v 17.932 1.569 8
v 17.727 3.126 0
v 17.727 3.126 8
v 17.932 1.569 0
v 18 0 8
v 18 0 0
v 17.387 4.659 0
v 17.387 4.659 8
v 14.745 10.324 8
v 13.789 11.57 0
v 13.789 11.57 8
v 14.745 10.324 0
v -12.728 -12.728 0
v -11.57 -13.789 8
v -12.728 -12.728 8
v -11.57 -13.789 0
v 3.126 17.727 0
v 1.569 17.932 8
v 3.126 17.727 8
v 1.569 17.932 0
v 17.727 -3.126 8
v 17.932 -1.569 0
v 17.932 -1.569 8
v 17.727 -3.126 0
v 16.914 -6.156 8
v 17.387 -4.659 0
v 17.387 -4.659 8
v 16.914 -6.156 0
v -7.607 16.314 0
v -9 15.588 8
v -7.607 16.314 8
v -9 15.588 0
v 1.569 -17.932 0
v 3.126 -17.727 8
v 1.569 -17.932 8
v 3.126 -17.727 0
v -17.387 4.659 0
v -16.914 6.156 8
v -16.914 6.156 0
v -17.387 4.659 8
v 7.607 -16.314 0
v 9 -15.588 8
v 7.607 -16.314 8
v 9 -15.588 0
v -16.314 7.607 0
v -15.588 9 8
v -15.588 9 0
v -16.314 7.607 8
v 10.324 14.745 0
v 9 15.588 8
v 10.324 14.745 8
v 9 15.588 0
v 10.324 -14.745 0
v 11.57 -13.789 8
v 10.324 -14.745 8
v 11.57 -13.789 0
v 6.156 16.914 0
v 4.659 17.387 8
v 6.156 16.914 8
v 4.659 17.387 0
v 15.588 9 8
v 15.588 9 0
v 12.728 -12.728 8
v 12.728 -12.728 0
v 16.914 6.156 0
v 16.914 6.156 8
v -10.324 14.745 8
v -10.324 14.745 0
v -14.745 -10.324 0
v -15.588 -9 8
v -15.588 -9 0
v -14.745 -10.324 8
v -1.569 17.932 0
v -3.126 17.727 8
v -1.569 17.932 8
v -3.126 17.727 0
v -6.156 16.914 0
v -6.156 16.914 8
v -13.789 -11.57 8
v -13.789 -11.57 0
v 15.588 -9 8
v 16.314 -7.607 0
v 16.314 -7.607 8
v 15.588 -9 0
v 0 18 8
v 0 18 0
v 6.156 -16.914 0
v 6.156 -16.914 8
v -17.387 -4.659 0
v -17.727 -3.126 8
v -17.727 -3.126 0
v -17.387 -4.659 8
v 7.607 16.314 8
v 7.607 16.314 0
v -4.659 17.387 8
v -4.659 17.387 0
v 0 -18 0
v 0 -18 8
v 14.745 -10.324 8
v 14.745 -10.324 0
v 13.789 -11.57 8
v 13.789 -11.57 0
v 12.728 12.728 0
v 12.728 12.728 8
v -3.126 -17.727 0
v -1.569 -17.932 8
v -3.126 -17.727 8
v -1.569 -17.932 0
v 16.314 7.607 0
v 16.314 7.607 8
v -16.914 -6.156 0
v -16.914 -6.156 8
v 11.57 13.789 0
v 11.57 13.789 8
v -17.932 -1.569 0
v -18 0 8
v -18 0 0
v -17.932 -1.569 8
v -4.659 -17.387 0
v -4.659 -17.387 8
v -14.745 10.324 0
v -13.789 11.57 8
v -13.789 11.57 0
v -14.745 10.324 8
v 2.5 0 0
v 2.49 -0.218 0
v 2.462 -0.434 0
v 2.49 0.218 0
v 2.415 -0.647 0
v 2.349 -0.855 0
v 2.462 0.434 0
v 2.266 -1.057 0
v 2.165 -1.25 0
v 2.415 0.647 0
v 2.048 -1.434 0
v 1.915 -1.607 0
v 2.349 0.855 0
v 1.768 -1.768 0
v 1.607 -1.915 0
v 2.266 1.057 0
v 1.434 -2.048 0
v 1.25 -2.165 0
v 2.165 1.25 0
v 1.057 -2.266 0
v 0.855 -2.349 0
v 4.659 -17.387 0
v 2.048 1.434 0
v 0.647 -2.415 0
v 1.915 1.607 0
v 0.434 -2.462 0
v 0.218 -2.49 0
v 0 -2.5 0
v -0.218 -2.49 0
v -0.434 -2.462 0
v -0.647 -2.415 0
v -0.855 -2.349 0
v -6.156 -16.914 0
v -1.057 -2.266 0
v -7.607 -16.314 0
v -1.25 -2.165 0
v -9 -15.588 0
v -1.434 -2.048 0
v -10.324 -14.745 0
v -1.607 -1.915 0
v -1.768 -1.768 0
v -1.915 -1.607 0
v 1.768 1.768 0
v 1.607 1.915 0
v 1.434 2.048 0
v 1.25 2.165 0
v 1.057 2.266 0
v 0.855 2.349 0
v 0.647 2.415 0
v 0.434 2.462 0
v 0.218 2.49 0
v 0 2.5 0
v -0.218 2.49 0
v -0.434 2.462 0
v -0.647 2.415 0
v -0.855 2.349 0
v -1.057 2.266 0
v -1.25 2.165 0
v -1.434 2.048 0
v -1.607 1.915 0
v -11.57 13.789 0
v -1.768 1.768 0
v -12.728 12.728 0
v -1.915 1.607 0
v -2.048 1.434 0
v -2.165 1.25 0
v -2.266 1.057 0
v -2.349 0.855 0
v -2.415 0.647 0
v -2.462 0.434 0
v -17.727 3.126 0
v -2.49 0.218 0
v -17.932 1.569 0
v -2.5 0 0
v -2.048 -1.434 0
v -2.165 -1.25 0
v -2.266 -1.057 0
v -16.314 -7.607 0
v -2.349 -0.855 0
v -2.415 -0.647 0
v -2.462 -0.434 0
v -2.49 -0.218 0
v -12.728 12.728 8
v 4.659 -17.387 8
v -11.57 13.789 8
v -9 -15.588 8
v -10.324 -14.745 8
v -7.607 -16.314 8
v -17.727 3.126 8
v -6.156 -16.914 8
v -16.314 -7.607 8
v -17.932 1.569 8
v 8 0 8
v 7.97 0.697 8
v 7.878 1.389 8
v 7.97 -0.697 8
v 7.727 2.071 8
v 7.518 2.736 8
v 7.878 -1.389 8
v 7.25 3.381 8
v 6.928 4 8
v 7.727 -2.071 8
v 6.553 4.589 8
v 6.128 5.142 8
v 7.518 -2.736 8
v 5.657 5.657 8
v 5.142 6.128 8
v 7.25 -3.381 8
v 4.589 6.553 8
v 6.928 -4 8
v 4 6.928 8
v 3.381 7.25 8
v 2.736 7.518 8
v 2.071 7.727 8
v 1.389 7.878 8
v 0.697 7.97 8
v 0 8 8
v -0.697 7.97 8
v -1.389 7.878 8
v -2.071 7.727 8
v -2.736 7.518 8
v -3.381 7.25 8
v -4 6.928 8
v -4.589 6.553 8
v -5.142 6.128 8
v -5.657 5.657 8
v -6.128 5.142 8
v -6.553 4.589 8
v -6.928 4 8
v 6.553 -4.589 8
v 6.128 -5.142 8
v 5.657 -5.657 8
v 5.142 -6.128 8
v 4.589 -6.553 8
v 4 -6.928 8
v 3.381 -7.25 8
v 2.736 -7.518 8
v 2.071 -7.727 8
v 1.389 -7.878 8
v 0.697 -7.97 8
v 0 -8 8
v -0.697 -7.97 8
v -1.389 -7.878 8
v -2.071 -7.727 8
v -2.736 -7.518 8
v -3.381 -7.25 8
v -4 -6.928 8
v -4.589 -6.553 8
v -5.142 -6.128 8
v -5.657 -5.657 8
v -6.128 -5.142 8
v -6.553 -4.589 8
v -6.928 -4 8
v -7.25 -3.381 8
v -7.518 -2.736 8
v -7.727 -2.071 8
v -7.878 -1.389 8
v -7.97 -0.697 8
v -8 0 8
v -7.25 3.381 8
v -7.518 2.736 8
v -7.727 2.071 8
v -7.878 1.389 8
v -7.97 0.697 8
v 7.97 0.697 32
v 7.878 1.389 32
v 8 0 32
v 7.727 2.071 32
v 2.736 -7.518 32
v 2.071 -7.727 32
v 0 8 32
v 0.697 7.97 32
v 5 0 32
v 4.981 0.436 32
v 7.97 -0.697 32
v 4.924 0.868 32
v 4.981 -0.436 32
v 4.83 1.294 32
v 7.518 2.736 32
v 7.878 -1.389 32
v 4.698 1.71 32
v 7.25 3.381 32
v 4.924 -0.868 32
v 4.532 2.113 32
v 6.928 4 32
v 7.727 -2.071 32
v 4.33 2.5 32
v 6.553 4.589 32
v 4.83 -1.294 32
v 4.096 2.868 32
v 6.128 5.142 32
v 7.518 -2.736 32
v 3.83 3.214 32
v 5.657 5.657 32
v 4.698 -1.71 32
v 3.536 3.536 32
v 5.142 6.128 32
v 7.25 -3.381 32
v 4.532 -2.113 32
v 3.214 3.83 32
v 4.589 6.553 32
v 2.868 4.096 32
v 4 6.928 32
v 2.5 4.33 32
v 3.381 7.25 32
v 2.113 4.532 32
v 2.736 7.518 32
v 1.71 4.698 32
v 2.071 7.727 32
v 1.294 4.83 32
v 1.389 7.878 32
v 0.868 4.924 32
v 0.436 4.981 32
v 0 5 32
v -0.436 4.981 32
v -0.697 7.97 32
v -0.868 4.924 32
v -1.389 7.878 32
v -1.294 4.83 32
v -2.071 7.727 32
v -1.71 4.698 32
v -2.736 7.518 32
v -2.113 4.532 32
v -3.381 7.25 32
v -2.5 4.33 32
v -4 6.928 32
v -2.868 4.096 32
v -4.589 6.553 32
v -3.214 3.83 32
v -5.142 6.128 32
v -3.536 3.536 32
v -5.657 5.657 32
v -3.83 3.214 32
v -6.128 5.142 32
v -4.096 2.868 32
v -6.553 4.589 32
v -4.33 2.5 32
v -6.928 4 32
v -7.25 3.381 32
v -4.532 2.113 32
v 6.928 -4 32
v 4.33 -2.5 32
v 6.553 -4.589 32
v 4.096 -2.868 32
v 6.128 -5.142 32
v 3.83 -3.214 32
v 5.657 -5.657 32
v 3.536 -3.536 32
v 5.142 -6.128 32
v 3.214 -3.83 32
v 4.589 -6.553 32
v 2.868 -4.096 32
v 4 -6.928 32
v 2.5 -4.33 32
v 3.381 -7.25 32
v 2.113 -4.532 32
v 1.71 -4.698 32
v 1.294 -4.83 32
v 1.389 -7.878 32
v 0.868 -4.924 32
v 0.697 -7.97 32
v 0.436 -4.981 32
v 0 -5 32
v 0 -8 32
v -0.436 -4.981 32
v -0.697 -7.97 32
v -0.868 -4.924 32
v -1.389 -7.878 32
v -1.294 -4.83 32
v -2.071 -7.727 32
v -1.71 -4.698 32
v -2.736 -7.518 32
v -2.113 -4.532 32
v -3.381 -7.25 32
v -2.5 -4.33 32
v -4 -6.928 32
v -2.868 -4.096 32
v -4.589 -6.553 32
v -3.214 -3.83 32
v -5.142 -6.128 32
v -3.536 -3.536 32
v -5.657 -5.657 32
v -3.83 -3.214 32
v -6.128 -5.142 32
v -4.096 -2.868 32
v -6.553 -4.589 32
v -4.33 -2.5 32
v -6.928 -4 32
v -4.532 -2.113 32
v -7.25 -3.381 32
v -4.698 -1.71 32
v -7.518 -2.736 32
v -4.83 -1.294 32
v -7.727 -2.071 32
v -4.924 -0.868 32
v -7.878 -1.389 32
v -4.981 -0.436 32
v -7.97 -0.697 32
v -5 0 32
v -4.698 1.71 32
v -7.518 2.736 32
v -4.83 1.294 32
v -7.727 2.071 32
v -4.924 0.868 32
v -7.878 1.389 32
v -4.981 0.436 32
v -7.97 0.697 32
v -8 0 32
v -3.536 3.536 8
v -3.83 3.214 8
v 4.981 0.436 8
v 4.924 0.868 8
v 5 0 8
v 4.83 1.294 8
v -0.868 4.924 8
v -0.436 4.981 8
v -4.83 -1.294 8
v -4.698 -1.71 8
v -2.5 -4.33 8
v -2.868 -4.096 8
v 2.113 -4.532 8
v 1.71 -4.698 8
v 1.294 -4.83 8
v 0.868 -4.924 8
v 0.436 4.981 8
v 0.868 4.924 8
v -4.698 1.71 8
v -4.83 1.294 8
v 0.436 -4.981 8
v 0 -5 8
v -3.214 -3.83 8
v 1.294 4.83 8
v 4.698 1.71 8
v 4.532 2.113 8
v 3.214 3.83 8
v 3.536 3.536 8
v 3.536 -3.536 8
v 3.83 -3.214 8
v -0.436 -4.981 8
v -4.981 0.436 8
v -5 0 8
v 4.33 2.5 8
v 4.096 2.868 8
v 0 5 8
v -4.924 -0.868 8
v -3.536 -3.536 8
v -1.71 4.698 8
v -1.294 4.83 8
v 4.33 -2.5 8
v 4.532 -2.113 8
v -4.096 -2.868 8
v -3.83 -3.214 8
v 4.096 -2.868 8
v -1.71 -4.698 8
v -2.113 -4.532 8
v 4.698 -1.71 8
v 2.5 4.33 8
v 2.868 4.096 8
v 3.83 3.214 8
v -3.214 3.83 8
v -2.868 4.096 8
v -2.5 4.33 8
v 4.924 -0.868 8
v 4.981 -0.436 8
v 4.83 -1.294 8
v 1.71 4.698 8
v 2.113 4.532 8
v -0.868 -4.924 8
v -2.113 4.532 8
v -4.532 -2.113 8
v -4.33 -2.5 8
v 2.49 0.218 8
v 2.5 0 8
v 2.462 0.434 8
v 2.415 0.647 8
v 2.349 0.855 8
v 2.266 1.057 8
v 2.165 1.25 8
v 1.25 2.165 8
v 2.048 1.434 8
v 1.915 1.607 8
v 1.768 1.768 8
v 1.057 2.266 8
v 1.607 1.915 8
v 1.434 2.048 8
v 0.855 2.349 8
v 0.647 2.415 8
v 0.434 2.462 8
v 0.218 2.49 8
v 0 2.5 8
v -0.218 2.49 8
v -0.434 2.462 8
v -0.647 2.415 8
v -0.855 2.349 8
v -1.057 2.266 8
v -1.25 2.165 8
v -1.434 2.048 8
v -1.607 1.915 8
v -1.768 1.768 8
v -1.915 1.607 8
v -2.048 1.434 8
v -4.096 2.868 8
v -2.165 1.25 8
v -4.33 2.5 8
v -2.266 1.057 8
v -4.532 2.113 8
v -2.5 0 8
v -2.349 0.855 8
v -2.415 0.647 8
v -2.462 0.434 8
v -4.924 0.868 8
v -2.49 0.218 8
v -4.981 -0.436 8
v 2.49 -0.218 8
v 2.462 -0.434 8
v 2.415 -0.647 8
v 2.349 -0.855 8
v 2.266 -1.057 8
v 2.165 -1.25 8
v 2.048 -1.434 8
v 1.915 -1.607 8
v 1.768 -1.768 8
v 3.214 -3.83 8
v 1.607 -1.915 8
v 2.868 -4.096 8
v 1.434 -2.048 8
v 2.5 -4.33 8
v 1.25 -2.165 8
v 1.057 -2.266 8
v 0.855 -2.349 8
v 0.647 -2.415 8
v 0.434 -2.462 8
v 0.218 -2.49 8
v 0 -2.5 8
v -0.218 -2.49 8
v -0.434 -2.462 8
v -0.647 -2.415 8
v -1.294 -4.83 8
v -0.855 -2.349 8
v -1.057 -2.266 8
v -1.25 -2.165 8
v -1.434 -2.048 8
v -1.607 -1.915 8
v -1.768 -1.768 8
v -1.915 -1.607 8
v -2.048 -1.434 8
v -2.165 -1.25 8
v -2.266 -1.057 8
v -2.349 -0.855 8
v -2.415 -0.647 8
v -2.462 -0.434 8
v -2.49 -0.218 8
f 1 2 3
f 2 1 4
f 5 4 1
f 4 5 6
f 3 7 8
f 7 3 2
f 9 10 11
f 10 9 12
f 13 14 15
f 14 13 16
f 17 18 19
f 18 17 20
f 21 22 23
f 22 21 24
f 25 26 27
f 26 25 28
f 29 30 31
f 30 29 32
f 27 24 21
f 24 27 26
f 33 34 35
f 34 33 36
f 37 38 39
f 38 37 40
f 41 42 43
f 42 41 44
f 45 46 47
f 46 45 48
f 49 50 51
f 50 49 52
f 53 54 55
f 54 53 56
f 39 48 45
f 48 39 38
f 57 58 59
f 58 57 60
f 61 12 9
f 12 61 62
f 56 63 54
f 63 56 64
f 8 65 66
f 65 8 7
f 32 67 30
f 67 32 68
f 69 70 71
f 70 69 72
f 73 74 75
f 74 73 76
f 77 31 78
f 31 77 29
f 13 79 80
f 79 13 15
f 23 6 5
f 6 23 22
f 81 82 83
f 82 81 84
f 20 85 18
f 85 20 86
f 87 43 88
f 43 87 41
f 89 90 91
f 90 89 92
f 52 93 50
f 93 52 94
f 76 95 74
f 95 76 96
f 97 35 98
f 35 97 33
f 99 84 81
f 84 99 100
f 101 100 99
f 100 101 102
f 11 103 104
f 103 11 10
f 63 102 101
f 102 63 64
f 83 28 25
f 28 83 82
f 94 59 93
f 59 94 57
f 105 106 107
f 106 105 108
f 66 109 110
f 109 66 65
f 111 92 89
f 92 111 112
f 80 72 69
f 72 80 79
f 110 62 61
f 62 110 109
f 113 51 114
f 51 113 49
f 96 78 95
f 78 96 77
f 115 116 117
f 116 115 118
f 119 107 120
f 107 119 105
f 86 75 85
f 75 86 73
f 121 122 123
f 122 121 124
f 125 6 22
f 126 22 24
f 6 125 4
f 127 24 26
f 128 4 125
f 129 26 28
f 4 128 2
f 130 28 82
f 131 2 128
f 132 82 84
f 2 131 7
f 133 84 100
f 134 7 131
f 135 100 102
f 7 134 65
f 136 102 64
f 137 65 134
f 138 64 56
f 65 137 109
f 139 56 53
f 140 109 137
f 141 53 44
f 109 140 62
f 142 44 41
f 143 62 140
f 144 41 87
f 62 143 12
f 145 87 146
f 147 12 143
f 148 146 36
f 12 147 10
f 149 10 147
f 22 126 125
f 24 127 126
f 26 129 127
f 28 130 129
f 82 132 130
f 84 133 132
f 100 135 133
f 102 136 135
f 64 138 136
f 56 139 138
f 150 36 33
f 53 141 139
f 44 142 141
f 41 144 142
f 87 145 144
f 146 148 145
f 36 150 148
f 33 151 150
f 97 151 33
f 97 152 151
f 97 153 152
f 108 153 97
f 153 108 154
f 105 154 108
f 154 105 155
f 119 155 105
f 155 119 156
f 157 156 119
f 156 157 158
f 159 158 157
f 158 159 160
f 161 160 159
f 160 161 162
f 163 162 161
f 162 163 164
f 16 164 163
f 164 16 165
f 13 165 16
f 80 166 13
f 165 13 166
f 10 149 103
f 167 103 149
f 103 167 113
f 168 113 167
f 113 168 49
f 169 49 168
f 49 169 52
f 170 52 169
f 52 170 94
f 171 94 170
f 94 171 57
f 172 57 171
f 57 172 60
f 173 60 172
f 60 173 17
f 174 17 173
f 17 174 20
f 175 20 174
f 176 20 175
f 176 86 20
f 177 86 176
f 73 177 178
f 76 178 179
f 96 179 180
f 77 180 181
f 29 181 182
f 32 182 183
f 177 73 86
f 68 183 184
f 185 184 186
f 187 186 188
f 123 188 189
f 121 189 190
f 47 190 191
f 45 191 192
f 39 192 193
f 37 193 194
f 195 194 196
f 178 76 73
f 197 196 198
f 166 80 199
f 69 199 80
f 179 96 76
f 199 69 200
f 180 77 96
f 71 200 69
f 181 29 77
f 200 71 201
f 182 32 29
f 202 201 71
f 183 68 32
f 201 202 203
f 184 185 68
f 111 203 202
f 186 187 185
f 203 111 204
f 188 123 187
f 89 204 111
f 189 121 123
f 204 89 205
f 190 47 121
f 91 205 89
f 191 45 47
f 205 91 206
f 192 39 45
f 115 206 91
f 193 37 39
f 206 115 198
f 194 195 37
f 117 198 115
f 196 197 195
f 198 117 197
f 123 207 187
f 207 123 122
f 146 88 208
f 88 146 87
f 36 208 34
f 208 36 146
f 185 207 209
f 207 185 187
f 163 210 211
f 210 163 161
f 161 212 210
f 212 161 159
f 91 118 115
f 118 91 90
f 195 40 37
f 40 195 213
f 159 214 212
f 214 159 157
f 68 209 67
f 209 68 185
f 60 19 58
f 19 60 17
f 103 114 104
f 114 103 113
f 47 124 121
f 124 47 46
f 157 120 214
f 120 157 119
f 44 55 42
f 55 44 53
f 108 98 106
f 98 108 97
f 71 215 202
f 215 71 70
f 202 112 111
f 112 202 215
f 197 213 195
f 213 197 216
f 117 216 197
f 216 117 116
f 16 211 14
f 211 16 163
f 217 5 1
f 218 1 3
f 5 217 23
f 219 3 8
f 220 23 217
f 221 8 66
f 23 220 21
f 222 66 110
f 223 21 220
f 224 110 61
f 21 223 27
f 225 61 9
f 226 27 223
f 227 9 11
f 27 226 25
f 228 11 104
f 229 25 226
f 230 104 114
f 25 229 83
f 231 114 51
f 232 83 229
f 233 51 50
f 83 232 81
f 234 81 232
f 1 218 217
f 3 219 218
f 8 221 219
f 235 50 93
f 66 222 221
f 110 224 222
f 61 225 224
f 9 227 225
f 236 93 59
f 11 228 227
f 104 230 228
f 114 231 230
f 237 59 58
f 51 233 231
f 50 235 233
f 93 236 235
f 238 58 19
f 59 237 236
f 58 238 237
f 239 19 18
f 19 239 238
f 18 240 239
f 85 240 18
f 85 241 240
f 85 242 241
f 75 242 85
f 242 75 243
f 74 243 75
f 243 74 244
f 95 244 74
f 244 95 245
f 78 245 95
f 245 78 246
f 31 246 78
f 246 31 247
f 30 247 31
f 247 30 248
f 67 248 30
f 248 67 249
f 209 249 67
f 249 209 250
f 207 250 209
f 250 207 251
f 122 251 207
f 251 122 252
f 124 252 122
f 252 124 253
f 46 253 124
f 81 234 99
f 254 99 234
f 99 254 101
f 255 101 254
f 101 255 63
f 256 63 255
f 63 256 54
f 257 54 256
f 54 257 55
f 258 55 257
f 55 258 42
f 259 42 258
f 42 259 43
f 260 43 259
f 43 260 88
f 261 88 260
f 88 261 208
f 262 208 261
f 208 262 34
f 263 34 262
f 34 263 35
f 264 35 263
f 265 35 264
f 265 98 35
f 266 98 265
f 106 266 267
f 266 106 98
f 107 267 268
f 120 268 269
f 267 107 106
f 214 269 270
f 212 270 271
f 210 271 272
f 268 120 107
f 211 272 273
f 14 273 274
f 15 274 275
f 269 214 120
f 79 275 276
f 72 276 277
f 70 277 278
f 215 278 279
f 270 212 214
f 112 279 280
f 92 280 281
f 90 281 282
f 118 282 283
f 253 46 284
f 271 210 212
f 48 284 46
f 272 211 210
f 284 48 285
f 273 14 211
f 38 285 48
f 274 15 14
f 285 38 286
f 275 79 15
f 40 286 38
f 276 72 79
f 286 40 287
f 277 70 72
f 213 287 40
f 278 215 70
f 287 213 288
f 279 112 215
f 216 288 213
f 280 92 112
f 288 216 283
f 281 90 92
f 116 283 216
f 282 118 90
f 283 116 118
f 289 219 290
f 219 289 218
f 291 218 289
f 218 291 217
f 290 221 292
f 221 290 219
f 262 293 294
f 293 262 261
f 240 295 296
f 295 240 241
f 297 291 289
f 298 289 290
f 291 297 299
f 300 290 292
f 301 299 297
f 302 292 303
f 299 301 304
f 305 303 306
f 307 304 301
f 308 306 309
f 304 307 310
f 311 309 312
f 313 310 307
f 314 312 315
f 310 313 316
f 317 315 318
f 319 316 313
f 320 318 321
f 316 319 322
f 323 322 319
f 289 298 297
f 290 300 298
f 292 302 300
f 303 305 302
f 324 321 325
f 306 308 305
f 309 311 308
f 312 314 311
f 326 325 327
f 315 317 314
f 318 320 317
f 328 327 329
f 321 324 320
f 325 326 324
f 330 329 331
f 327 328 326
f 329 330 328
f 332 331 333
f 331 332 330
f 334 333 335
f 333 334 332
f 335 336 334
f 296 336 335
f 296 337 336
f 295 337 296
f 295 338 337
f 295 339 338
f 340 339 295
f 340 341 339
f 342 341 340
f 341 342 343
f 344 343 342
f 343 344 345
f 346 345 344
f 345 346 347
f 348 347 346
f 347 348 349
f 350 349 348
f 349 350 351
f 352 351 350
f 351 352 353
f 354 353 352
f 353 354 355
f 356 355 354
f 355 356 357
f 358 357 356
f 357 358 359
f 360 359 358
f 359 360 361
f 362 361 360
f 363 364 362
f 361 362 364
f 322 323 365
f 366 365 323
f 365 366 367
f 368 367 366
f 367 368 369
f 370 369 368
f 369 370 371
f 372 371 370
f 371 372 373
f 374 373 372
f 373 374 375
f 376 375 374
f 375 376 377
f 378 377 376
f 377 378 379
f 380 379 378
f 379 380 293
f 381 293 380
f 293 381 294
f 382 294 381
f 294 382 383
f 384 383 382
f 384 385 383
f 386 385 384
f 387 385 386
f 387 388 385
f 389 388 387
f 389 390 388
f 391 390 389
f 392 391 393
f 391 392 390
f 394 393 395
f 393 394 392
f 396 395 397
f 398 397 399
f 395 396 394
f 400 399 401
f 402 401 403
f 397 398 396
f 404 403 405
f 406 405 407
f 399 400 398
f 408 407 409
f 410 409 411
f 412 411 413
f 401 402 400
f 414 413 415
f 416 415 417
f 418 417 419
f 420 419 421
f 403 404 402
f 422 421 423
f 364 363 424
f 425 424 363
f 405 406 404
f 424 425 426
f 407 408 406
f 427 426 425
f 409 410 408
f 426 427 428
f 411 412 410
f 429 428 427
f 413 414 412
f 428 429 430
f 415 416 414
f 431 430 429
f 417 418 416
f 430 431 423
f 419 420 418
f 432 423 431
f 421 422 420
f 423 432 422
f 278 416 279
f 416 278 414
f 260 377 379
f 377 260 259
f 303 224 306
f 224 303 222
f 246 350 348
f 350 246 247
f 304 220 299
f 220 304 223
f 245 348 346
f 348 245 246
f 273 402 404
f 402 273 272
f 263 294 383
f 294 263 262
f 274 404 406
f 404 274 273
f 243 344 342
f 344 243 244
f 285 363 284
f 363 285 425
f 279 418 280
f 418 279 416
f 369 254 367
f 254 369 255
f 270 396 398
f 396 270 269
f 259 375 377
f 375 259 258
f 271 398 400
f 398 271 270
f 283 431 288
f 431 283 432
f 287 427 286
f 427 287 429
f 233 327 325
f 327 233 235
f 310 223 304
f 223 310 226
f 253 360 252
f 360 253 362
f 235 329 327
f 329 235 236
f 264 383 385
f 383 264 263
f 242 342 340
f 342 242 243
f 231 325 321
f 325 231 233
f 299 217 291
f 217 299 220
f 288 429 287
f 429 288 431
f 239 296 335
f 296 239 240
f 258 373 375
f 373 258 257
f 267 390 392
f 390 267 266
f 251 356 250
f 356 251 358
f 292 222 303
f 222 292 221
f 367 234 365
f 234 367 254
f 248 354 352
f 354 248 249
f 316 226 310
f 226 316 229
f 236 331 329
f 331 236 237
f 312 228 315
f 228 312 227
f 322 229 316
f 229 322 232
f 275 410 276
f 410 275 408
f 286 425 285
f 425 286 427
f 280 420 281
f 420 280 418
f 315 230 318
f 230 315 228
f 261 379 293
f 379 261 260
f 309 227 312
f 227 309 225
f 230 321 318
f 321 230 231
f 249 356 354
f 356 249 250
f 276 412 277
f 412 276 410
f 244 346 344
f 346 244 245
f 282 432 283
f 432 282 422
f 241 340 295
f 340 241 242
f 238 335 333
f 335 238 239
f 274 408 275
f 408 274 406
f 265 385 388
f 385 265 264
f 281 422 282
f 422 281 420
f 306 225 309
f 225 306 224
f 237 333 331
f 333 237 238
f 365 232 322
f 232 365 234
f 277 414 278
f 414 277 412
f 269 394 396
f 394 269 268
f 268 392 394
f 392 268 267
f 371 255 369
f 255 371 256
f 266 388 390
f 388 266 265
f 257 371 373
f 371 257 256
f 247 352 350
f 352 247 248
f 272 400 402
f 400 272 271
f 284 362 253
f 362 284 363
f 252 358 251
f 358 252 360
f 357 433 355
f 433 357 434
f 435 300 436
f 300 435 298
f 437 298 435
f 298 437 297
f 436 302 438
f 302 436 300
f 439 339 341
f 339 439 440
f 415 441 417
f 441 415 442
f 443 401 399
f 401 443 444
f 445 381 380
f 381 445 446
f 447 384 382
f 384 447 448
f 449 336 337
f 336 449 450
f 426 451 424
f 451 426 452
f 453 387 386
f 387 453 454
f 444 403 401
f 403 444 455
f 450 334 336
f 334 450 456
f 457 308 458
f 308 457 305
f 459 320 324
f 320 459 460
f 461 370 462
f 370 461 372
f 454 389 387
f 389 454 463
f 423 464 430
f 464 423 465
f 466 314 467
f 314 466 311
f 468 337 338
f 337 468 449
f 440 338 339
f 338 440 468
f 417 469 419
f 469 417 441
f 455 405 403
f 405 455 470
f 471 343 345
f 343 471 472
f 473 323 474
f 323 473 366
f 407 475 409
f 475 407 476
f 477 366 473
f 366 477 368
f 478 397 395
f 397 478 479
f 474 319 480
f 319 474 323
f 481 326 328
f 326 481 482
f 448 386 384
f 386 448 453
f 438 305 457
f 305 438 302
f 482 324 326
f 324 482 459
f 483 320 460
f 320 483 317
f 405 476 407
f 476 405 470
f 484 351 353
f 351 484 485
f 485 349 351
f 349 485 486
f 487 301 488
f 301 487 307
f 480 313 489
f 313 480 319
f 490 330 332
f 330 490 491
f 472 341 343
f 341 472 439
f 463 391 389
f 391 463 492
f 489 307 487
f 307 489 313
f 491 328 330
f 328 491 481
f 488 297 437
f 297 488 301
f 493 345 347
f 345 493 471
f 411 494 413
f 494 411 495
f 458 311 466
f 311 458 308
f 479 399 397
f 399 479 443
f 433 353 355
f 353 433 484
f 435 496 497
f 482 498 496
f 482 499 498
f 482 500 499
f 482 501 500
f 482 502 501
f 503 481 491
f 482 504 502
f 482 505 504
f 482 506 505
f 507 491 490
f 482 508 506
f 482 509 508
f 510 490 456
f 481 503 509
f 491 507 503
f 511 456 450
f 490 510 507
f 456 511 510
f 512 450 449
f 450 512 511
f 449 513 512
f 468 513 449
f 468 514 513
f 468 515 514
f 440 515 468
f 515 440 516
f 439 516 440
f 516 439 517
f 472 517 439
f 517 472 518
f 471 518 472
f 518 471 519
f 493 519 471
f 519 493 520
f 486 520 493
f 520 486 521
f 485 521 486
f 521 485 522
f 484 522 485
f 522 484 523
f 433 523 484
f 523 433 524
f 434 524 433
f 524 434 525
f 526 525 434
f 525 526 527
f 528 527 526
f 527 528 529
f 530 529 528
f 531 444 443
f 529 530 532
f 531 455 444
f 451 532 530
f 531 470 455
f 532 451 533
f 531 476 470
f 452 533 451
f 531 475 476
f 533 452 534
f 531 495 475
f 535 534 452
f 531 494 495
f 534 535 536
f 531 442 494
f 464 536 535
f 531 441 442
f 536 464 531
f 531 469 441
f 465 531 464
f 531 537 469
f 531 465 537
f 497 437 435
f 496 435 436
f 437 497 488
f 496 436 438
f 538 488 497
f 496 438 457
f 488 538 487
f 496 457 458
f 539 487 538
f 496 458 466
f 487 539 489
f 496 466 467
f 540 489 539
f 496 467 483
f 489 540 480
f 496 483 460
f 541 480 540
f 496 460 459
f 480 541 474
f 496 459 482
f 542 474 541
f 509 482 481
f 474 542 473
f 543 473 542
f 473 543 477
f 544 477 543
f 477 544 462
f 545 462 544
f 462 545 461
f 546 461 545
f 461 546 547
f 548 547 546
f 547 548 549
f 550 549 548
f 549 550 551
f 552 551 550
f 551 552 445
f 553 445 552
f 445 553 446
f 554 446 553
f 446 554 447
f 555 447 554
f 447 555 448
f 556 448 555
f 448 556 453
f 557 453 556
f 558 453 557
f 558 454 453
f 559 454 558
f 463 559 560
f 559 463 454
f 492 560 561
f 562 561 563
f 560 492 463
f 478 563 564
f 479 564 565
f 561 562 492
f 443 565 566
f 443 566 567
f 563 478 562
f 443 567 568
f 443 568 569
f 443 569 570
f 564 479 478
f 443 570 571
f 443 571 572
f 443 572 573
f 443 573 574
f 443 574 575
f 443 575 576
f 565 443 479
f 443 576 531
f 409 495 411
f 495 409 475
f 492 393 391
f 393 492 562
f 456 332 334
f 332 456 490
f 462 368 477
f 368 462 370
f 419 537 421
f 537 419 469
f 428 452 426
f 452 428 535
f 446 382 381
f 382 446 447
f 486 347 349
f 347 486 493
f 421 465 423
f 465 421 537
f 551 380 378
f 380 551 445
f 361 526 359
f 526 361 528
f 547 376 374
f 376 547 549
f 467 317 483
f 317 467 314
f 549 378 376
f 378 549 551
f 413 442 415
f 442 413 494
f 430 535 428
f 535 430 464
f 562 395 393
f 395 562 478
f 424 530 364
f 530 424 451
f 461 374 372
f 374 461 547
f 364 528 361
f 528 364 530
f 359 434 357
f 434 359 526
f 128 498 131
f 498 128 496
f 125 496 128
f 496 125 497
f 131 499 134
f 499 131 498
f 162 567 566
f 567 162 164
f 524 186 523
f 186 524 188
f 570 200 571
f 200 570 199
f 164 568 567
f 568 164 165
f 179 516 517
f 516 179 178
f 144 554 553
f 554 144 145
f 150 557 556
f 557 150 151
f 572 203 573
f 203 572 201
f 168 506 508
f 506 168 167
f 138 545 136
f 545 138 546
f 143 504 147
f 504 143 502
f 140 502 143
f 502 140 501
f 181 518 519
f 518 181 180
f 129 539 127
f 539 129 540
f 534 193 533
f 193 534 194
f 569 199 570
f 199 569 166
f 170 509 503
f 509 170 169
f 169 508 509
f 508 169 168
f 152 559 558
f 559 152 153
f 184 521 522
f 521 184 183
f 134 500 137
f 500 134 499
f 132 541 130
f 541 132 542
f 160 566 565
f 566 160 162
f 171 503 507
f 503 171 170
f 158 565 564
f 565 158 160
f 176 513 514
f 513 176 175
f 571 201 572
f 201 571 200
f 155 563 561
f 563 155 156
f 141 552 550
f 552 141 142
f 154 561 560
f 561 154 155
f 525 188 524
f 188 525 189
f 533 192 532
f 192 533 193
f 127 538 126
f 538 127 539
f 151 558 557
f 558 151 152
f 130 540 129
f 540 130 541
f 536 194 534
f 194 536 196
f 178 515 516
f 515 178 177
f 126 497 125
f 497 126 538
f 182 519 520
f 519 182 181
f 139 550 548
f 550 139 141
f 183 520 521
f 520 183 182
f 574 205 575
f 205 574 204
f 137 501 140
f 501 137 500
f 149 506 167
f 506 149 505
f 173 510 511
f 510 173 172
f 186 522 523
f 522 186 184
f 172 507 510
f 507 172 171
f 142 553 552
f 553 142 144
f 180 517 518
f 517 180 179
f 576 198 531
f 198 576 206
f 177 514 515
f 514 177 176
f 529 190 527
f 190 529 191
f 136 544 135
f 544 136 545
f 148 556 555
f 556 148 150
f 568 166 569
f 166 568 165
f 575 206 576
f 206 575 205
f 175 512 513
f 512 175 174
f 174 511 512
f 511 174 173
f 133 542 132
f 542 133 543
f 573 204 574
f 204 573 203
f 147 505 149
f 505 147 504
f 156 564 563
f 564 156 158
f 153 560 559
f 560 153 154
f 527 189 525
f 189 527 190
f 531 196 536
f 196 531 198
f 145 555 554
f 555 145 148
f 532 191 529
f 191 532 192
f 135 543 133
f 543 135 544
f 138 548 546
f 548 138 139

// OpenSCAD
// TS-PET-C09 - Teaser Arm Socket
$fn = 72; base_d=36; base_h=8; socket_d=10; socket_h=24; mount_hole_d=5;
difference(){ union(){ cylinder(h=base_h,d=base_d); translate([0,0,base_h]) cylinder(h=socket_h,d=socket_d+6); } translate([0,0,base_h]) cylinder(h=socket_h+1,d=socket_d); translate([0,0,-1]) cylinder(h=base_h+2,d=mount_hole_d); }
